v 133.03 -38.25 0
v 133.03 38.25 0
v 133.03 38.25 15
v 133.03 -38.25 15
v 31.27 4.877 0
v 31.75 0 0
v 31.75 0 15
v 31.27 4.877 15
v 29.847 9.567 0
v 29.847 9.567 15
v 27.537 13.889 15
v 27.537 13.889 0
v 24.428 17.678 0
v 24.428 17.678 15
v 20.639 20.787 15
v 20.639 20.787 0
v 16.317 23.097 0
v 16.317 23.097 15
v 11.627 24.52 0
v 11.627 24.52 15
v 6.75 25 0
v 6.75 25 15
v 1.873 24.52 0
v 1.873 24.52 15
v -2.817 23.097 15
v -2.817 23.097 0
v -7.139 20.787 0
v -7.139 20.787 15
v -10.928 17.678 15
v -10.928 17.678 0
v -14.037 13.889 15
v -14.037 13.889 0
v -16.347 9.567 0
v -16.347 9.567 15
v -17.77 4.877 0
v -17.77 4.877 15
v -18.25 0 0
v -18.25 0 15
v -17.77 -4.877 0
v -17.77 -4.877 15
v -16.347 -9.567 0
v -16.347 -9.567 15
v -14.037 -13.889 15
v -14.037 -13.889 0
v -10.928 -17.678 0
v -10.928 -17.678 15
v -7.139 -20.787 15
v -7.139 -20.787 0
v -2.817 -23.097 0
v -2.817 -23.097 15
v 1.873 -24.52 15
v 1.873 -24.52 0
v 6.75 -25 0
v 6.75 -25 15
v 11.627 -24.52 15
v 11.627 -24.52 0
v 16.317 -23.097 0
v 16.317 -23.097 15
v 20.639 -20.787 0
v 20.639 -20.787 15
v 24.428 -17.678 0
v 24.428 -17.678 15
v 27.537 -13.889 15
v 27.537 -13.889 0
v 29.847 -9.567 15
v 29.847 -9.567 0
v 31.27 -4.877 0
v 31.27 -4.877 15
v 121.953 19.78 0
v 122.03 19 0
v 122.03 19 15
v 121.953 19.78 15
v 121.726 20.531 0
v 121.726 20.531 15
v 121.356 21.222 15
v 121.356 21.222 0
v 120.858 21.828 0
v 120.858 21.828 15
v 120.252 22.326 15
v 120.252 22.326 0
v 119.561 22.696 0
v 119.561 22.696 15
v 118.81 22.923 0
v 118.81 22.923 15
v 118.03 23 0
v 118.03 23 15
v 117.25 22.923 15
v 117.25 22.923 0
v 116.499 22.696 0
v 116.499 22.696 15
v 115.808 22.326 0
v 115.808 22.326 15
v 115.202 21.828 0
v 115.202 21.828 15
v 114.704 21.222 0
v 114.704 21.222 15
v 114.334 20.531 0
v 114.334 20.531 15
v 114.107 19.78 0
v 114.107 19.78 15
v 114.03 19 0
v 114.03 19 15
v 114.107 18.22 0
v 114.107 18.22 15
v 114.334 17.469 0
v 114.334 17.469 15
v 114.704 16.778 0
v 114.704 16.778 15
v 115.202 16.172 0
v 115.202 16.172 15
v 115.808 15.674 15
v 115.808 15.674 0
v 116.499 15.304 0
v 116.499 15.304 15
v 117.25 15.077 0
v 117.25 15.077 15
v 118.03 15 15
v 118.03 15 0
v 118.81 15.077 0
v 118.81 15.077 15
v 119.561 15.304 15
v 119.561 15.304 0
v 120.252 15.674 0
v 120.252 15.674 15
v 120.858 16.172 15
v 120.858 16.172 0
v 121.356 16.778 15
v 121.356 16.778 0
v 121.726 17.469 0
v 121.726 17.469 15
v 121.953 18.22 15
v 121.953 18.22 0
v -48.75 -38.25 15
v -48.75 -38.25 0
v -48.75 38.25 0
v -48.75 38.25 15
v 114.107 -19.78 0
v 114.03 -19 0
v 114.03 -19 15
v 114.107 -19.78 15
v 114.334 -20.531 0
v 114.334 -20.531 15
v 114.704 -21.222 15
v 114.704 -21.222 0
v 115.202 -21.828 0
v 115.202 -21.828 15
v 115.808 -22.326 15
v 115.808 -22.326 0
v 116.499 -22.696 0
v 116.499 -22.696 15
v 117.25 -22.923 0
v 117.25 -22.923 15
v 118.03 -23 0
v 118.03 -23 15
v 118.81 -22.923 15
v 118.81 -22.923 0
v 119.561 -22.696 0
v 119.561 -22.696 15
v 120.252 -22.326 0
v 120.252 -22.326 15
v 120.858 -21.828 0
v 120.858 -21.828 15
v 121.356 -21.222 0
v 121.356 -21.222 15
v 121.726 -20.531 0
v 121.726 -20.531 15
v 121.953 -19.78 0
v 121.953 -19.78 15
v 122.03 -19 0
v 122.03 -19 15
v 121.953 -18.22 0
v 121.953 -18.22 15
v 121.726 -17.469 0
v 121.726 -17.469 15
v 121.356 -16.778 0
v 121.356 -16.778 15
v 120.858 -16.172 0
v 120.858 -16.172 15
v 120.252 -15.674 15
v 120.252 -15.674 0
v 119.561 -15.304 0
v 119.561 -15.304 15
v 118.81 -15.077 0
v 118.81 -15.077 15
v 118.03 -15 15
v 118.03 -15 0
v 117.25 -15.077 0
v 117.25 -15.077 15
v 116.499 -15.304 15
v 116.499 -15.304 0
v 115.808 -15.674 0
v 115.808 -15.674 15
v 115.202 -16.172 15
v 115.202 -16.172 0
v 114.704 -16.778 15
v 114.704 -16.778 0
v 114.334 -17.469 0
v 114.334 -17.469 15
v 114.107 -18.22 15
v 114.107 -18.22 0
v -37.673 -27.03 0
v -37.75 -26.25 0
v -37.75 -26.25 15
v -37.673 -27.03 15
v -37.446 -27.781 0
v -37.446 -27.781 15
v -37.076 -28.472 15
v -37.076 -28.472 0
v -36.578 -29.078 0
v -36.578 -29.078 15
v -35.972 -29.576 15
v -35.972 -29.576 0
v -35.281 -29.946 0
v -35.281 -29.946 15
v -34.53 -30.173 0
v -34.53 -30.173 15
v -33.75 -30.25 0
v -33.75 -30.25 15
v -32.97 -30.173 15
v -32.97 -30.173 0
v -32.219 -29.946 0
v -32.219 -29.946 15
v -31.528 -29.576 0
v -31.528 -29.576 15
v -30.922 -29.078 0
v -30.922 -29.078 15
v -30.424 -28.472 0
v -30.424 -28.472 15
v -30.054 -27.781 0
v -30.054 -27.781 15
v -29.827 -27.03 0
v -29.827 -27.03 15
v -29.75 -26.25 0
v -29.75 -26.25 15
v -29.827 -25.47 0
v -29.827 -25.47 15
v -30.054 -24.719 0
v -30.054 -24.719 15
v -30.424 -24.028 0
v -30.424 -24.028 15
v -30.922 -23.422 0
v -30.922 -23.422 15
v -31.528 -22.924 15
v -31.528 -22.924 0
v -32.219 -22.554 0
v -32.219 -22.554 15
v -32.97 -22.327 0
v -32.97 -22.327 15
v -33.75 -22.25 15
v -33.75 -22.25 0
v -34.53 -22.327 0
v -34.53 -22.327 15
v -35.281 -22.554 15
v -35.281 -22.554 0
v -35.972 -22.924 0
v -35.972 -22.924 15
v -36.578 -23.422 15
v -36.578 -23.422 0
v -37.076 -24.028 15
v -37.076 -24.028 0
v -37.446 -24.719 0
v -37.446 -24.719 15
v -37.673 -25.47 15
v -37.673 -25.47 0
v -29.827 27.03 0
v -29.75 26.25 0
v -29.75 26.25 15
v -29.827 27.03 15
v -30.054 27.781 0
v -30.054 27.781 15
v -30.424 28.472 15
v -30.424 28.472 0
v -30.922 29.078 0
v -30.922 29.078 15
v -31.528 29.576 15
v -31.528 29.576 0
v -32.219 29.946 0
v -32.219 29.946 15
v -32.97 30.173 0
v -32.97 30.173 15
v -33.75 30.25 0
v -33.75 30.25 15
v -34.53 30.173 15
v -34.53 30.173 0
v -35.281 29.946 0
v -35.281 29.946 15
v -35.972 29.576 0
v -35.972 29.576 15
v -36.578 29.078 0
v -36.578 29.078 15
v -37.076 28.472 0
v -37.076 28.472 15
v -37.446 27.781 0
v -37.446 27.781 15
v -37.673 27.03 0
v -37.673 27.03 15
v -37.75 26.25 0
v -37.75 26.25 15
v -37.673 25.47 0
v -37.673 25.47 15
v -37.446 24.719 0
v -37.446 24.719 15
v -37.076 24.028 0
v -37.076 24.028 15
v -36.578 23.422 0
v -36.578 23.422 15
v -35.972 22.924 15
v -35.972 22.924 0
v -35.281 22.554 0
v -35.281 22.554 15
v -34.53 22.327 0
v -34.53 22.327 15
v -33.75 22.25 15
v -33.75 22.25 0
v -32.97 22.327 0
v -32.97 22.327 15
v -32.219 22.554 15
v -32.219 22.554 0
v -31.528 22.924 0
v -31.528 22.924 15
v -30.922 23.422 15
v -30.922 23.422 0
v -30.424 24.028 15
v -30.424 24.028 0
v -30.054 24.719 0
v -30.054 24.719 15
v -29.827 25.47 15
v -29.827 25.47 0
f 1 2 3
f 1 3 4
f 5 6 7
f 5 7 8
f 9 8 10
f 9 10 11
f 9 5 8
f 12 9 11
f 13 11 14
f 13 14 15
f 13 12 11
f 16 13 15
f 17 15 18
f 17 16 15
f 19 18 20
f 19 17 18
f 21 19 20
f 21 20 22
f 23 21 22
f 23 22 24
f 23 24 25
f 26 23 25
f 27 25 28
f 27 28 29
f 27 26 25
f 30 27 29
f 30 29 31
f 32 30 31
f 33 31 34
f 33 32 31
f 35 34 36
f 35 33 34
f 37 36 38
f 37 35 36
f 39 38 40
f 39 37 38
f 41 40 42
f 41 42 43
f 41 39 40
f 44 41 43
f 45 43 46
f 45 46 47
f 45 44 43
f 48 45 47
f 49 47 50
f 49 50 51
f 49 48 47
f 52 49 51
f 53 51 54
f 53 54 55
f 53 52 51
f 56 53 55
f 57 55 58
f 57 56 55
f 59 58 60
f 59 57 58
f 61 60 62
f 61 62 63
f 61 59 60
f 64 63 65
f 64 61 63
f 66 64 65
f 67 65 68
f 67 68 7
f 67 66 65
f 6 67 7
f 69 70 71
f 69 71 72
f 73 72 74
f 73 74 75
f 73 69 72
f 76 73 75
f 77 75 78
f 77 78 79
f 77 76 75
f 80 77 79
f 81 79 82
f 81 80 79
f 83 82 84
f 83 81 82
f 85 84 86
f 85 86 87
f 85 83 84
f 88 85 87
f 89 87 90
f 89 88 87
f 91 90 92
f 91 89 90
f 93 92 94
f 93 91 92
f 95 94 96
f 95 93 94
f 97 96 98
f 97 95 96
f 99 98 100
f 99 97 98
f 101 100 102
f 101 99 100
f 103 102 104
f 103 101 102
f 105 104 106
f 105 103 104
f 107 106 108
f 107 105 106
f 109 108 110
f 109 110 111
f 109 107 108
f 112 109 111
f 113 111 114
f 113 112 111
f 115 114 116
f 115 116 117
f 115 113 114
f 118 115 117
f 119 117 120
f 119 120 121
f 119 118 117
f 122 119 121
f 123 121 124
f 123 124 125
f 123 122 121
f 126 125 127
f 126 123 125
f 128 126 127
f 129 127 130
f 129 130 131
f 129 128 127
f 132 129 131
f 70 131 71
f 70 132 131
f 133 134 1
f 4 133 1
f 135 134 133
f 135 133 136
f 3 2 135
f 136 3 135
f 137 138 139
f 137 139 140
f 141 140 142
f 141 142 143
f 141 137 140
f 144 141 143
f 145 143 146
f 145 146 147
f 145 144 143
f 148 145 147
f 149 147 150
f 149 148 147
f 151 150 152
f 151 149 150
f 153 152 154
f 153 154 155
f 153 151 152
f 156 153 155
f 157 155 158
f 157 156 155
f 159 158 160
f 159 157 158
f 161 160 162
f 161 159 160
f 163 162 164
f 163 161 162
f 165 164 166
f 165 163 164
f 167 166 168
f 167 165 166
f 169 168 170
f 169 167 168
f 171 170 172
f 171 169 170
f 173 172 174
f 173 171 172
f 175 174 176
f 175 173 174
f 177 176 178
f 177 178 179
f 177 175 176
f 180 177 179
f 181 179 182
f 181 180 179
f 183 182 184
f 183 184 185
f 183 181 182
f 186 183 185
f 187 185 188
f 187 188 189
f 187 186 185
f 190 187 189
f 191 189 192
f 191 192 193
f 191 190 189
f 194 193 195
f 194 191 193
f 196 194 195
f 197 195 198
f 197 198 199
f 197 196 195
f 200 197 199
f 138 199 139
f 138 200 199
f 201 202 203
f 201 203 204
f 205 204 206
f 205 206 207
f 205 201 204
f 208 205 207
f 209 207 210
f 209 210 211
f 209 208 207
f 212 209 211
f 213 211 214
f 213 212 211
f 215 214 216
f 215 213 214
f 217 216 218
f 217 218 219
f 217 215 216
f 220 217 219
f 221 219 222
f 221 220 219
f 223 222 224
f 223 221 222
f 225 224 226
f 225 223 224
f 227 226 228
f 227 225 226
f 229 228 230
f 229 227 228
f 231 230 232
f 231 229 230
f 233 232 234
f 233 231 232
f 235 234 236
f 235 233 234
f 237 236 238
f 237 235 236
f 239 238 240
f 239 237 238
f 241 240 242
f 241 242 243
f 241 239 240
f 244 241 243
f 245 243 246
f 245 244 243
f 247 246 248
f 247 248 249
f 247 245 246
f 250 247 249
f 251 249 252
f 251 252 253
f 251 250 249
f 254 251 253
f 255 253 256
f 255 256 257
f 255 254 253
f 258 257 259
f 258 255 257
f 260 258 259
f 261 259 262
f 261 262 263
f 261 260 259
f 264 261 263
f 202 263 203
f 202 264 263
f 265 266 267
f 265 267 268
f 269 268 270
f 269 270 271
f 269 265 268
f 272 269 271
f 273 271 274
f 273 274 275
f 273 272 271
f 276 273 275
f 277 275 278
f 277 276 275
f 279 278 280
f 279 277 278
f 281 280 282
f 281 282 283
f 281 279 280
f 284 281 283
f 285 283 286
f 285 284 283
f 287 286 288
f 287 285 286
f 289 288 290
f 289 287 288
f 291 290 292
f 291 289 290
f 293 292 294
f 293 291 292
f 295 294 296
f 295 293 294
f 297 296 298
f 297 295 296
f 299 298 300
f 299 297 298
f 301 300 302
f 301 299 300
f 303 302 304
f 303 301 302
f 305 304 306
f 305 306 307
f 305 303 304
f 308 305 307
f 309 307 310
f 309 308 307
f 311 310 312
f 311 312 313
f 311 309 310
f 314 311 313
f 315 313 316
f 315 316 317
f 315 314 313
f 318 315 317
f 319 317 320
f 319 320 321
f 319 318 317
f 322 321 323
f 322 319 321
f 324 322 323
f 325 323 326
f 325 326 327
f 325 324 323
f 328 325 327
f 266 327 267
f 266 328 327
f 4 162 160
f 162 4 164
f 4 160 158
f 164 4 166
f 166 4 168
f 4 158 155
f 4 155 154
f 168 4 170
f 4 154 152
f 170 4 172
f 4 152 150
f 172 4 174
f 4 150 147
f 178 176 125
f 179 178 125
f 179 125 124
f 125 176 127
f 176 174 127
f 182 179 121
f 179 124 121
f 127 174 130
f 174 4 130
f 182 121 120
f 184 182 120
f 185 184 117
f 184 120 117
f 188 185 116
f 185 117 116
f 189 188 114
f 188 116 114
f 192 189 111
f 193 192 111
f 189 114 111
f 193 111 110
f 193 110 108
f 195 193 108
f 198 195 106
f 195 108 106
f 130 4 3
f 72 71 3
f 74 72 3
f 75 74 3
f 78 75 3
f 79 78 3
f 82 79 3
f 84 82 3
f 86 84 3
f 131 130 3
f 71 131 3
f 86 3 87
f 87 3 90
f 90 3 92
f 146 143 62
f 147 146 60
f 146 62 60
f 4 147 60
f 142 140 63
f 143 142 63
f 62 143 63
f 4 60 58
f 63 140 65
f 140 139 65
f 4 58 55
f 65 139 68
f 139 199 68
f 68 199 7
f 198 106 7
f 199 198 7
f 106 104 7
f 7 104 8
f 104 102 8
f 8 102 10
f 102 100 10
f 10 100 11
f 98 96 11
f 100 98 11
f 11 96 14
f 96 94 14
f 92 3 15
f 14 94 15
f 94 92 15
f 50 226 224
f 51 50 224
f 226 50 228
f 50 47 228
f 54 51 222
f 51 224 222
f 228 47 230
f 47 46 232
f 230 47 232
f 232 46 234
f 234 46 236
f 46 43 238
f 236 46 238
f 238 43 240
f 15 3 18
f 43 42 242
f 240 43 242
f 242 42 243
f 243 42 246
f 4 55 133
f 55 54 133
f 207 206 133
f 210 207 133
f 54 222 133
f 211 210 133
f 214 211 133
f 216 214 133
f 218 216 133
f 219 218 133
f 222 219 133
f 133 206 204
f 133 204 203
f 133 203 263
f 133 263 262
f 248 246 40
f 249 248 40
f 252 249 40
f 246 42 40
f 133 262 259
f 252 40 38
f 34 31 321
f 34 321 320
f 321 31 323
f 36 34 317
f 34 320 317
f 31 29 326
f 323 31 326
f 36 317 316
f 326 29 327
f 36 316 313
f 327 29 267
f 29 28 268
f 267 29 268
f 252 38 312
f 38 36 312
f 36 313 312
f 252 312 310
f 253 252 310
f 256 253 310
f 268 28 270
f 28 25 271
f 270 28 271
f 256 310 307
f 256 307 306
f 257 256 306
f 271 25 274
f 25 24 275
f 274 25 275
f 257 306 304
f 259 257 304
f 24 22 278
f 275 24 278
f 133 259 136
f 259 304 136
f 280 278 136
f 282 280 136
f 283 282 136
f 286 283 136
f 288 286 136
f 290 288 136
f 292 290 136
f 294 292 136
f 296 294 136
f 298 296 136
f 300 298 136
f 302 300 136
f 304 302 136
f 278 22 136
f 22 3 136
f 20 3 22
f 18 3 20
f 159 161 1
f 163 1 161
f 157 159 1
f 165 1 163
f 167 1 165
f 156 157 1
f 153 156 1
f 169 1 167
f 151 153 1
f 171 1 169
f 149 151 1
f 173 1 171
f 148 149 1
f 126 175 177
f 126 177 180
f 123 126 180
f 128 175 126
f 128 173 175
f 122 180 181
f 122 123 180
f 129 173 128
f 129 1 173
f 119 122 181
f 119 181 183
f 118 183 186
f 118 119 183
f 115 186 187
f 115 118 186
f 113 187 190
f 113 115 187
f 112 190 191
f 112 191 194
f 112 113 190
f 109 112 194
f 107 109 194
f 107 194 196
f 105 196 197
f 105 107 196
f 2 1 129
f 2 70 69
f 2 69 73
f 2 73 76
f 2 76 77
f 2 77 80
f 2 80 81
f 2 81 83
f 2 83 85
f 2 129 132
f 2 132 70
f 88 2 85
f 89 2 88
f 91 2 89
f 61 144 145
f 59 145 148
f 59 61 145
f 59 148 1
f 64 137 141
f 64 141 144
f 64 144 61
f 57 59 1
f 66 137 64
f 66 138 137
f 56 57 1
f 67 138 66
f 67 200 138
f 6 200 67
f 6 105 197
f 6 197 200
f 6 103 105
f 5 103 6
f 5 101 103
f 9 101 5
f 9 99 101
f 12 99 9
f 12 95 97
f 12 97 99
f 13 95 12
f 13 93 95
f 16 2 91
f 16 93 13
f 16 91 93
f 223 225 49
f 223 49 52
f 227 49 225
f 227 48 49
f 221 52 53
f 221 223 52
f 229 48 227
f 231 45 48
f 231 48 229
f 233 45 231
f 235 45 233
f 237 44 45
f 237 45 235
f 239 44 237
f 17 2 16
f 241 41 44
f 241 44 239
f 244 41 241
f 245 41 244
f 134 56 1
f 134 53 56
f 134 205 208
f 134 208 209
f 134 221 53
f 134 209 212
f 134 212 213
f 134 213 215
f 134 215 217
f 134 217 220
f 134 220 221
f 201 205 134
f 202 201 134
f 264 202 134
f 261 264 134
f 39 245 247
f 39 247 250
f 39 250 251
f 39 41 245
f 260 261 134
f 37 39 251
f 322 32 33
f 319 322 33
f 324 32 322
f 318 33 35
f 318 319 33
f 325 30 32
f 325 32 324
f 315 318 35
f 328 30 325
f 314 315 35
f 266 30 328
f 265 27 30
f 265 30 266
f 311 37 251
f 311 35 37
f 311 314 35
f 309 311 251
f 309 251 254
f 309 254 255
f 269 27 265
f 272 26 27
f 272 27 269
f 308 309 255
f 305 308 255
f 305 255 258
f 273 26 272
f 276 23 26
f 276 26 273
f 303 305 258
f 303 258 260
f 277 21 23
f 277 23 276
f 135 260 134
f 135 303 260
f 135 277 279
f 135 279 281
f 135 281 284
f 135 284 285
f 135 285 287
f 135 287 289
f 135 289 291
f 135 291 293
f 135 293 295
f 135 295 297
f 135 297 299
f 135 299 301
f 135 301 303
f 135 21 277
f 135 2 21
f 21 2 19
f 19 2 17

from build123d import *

# Parameters (mm, degrees)
SKETCH_1_R      = 4
SKETCH_1_R_2    = 25
EXTRUDE_1_DEPTH = 15


with BuildPart() as part:
    # 草图1 → 凸台-拉伸1 (new body)
    with BuildSketch(Plane.XY):
        Polygon((-46.25, 38.25), (-21.25, 38.25), (130.53, 38.25), (133.03, 38.25), (133.03, -38.25), (130.53, -38.25), (-21.25, -38.25), (-46.25, -38.25), (-48.75, -38.25), (-48.75, 38.25), align=None)
        with Locations((-33.75, 26.25)):
            Circle(SKETCH_1_R, mode=Mode.SUBTRACT)
        with Locations(Location((-33.75, -26.25, 0), (0, 0, 180))):
            Circle(SKETCH_1_R, mode=Mode.SUBTRACT)
        with Locations((118.03, 19)):
            Circle(SKETCH_1_R, mode=Mode.SUBTRACT)
        with Locations(Location((118.03, -19, 0), (0, 0, 180))):
            Circle(SKETCH_1_R, mode=Mode.SUBTRACT)
        with Locations((6.75, 0)):
            Circle(SKETCH_1_R_2, mode=Mode.SUBTRACT)
    extrude(amount=EXTRUDE_1_DEPTH)


solid = part.part
